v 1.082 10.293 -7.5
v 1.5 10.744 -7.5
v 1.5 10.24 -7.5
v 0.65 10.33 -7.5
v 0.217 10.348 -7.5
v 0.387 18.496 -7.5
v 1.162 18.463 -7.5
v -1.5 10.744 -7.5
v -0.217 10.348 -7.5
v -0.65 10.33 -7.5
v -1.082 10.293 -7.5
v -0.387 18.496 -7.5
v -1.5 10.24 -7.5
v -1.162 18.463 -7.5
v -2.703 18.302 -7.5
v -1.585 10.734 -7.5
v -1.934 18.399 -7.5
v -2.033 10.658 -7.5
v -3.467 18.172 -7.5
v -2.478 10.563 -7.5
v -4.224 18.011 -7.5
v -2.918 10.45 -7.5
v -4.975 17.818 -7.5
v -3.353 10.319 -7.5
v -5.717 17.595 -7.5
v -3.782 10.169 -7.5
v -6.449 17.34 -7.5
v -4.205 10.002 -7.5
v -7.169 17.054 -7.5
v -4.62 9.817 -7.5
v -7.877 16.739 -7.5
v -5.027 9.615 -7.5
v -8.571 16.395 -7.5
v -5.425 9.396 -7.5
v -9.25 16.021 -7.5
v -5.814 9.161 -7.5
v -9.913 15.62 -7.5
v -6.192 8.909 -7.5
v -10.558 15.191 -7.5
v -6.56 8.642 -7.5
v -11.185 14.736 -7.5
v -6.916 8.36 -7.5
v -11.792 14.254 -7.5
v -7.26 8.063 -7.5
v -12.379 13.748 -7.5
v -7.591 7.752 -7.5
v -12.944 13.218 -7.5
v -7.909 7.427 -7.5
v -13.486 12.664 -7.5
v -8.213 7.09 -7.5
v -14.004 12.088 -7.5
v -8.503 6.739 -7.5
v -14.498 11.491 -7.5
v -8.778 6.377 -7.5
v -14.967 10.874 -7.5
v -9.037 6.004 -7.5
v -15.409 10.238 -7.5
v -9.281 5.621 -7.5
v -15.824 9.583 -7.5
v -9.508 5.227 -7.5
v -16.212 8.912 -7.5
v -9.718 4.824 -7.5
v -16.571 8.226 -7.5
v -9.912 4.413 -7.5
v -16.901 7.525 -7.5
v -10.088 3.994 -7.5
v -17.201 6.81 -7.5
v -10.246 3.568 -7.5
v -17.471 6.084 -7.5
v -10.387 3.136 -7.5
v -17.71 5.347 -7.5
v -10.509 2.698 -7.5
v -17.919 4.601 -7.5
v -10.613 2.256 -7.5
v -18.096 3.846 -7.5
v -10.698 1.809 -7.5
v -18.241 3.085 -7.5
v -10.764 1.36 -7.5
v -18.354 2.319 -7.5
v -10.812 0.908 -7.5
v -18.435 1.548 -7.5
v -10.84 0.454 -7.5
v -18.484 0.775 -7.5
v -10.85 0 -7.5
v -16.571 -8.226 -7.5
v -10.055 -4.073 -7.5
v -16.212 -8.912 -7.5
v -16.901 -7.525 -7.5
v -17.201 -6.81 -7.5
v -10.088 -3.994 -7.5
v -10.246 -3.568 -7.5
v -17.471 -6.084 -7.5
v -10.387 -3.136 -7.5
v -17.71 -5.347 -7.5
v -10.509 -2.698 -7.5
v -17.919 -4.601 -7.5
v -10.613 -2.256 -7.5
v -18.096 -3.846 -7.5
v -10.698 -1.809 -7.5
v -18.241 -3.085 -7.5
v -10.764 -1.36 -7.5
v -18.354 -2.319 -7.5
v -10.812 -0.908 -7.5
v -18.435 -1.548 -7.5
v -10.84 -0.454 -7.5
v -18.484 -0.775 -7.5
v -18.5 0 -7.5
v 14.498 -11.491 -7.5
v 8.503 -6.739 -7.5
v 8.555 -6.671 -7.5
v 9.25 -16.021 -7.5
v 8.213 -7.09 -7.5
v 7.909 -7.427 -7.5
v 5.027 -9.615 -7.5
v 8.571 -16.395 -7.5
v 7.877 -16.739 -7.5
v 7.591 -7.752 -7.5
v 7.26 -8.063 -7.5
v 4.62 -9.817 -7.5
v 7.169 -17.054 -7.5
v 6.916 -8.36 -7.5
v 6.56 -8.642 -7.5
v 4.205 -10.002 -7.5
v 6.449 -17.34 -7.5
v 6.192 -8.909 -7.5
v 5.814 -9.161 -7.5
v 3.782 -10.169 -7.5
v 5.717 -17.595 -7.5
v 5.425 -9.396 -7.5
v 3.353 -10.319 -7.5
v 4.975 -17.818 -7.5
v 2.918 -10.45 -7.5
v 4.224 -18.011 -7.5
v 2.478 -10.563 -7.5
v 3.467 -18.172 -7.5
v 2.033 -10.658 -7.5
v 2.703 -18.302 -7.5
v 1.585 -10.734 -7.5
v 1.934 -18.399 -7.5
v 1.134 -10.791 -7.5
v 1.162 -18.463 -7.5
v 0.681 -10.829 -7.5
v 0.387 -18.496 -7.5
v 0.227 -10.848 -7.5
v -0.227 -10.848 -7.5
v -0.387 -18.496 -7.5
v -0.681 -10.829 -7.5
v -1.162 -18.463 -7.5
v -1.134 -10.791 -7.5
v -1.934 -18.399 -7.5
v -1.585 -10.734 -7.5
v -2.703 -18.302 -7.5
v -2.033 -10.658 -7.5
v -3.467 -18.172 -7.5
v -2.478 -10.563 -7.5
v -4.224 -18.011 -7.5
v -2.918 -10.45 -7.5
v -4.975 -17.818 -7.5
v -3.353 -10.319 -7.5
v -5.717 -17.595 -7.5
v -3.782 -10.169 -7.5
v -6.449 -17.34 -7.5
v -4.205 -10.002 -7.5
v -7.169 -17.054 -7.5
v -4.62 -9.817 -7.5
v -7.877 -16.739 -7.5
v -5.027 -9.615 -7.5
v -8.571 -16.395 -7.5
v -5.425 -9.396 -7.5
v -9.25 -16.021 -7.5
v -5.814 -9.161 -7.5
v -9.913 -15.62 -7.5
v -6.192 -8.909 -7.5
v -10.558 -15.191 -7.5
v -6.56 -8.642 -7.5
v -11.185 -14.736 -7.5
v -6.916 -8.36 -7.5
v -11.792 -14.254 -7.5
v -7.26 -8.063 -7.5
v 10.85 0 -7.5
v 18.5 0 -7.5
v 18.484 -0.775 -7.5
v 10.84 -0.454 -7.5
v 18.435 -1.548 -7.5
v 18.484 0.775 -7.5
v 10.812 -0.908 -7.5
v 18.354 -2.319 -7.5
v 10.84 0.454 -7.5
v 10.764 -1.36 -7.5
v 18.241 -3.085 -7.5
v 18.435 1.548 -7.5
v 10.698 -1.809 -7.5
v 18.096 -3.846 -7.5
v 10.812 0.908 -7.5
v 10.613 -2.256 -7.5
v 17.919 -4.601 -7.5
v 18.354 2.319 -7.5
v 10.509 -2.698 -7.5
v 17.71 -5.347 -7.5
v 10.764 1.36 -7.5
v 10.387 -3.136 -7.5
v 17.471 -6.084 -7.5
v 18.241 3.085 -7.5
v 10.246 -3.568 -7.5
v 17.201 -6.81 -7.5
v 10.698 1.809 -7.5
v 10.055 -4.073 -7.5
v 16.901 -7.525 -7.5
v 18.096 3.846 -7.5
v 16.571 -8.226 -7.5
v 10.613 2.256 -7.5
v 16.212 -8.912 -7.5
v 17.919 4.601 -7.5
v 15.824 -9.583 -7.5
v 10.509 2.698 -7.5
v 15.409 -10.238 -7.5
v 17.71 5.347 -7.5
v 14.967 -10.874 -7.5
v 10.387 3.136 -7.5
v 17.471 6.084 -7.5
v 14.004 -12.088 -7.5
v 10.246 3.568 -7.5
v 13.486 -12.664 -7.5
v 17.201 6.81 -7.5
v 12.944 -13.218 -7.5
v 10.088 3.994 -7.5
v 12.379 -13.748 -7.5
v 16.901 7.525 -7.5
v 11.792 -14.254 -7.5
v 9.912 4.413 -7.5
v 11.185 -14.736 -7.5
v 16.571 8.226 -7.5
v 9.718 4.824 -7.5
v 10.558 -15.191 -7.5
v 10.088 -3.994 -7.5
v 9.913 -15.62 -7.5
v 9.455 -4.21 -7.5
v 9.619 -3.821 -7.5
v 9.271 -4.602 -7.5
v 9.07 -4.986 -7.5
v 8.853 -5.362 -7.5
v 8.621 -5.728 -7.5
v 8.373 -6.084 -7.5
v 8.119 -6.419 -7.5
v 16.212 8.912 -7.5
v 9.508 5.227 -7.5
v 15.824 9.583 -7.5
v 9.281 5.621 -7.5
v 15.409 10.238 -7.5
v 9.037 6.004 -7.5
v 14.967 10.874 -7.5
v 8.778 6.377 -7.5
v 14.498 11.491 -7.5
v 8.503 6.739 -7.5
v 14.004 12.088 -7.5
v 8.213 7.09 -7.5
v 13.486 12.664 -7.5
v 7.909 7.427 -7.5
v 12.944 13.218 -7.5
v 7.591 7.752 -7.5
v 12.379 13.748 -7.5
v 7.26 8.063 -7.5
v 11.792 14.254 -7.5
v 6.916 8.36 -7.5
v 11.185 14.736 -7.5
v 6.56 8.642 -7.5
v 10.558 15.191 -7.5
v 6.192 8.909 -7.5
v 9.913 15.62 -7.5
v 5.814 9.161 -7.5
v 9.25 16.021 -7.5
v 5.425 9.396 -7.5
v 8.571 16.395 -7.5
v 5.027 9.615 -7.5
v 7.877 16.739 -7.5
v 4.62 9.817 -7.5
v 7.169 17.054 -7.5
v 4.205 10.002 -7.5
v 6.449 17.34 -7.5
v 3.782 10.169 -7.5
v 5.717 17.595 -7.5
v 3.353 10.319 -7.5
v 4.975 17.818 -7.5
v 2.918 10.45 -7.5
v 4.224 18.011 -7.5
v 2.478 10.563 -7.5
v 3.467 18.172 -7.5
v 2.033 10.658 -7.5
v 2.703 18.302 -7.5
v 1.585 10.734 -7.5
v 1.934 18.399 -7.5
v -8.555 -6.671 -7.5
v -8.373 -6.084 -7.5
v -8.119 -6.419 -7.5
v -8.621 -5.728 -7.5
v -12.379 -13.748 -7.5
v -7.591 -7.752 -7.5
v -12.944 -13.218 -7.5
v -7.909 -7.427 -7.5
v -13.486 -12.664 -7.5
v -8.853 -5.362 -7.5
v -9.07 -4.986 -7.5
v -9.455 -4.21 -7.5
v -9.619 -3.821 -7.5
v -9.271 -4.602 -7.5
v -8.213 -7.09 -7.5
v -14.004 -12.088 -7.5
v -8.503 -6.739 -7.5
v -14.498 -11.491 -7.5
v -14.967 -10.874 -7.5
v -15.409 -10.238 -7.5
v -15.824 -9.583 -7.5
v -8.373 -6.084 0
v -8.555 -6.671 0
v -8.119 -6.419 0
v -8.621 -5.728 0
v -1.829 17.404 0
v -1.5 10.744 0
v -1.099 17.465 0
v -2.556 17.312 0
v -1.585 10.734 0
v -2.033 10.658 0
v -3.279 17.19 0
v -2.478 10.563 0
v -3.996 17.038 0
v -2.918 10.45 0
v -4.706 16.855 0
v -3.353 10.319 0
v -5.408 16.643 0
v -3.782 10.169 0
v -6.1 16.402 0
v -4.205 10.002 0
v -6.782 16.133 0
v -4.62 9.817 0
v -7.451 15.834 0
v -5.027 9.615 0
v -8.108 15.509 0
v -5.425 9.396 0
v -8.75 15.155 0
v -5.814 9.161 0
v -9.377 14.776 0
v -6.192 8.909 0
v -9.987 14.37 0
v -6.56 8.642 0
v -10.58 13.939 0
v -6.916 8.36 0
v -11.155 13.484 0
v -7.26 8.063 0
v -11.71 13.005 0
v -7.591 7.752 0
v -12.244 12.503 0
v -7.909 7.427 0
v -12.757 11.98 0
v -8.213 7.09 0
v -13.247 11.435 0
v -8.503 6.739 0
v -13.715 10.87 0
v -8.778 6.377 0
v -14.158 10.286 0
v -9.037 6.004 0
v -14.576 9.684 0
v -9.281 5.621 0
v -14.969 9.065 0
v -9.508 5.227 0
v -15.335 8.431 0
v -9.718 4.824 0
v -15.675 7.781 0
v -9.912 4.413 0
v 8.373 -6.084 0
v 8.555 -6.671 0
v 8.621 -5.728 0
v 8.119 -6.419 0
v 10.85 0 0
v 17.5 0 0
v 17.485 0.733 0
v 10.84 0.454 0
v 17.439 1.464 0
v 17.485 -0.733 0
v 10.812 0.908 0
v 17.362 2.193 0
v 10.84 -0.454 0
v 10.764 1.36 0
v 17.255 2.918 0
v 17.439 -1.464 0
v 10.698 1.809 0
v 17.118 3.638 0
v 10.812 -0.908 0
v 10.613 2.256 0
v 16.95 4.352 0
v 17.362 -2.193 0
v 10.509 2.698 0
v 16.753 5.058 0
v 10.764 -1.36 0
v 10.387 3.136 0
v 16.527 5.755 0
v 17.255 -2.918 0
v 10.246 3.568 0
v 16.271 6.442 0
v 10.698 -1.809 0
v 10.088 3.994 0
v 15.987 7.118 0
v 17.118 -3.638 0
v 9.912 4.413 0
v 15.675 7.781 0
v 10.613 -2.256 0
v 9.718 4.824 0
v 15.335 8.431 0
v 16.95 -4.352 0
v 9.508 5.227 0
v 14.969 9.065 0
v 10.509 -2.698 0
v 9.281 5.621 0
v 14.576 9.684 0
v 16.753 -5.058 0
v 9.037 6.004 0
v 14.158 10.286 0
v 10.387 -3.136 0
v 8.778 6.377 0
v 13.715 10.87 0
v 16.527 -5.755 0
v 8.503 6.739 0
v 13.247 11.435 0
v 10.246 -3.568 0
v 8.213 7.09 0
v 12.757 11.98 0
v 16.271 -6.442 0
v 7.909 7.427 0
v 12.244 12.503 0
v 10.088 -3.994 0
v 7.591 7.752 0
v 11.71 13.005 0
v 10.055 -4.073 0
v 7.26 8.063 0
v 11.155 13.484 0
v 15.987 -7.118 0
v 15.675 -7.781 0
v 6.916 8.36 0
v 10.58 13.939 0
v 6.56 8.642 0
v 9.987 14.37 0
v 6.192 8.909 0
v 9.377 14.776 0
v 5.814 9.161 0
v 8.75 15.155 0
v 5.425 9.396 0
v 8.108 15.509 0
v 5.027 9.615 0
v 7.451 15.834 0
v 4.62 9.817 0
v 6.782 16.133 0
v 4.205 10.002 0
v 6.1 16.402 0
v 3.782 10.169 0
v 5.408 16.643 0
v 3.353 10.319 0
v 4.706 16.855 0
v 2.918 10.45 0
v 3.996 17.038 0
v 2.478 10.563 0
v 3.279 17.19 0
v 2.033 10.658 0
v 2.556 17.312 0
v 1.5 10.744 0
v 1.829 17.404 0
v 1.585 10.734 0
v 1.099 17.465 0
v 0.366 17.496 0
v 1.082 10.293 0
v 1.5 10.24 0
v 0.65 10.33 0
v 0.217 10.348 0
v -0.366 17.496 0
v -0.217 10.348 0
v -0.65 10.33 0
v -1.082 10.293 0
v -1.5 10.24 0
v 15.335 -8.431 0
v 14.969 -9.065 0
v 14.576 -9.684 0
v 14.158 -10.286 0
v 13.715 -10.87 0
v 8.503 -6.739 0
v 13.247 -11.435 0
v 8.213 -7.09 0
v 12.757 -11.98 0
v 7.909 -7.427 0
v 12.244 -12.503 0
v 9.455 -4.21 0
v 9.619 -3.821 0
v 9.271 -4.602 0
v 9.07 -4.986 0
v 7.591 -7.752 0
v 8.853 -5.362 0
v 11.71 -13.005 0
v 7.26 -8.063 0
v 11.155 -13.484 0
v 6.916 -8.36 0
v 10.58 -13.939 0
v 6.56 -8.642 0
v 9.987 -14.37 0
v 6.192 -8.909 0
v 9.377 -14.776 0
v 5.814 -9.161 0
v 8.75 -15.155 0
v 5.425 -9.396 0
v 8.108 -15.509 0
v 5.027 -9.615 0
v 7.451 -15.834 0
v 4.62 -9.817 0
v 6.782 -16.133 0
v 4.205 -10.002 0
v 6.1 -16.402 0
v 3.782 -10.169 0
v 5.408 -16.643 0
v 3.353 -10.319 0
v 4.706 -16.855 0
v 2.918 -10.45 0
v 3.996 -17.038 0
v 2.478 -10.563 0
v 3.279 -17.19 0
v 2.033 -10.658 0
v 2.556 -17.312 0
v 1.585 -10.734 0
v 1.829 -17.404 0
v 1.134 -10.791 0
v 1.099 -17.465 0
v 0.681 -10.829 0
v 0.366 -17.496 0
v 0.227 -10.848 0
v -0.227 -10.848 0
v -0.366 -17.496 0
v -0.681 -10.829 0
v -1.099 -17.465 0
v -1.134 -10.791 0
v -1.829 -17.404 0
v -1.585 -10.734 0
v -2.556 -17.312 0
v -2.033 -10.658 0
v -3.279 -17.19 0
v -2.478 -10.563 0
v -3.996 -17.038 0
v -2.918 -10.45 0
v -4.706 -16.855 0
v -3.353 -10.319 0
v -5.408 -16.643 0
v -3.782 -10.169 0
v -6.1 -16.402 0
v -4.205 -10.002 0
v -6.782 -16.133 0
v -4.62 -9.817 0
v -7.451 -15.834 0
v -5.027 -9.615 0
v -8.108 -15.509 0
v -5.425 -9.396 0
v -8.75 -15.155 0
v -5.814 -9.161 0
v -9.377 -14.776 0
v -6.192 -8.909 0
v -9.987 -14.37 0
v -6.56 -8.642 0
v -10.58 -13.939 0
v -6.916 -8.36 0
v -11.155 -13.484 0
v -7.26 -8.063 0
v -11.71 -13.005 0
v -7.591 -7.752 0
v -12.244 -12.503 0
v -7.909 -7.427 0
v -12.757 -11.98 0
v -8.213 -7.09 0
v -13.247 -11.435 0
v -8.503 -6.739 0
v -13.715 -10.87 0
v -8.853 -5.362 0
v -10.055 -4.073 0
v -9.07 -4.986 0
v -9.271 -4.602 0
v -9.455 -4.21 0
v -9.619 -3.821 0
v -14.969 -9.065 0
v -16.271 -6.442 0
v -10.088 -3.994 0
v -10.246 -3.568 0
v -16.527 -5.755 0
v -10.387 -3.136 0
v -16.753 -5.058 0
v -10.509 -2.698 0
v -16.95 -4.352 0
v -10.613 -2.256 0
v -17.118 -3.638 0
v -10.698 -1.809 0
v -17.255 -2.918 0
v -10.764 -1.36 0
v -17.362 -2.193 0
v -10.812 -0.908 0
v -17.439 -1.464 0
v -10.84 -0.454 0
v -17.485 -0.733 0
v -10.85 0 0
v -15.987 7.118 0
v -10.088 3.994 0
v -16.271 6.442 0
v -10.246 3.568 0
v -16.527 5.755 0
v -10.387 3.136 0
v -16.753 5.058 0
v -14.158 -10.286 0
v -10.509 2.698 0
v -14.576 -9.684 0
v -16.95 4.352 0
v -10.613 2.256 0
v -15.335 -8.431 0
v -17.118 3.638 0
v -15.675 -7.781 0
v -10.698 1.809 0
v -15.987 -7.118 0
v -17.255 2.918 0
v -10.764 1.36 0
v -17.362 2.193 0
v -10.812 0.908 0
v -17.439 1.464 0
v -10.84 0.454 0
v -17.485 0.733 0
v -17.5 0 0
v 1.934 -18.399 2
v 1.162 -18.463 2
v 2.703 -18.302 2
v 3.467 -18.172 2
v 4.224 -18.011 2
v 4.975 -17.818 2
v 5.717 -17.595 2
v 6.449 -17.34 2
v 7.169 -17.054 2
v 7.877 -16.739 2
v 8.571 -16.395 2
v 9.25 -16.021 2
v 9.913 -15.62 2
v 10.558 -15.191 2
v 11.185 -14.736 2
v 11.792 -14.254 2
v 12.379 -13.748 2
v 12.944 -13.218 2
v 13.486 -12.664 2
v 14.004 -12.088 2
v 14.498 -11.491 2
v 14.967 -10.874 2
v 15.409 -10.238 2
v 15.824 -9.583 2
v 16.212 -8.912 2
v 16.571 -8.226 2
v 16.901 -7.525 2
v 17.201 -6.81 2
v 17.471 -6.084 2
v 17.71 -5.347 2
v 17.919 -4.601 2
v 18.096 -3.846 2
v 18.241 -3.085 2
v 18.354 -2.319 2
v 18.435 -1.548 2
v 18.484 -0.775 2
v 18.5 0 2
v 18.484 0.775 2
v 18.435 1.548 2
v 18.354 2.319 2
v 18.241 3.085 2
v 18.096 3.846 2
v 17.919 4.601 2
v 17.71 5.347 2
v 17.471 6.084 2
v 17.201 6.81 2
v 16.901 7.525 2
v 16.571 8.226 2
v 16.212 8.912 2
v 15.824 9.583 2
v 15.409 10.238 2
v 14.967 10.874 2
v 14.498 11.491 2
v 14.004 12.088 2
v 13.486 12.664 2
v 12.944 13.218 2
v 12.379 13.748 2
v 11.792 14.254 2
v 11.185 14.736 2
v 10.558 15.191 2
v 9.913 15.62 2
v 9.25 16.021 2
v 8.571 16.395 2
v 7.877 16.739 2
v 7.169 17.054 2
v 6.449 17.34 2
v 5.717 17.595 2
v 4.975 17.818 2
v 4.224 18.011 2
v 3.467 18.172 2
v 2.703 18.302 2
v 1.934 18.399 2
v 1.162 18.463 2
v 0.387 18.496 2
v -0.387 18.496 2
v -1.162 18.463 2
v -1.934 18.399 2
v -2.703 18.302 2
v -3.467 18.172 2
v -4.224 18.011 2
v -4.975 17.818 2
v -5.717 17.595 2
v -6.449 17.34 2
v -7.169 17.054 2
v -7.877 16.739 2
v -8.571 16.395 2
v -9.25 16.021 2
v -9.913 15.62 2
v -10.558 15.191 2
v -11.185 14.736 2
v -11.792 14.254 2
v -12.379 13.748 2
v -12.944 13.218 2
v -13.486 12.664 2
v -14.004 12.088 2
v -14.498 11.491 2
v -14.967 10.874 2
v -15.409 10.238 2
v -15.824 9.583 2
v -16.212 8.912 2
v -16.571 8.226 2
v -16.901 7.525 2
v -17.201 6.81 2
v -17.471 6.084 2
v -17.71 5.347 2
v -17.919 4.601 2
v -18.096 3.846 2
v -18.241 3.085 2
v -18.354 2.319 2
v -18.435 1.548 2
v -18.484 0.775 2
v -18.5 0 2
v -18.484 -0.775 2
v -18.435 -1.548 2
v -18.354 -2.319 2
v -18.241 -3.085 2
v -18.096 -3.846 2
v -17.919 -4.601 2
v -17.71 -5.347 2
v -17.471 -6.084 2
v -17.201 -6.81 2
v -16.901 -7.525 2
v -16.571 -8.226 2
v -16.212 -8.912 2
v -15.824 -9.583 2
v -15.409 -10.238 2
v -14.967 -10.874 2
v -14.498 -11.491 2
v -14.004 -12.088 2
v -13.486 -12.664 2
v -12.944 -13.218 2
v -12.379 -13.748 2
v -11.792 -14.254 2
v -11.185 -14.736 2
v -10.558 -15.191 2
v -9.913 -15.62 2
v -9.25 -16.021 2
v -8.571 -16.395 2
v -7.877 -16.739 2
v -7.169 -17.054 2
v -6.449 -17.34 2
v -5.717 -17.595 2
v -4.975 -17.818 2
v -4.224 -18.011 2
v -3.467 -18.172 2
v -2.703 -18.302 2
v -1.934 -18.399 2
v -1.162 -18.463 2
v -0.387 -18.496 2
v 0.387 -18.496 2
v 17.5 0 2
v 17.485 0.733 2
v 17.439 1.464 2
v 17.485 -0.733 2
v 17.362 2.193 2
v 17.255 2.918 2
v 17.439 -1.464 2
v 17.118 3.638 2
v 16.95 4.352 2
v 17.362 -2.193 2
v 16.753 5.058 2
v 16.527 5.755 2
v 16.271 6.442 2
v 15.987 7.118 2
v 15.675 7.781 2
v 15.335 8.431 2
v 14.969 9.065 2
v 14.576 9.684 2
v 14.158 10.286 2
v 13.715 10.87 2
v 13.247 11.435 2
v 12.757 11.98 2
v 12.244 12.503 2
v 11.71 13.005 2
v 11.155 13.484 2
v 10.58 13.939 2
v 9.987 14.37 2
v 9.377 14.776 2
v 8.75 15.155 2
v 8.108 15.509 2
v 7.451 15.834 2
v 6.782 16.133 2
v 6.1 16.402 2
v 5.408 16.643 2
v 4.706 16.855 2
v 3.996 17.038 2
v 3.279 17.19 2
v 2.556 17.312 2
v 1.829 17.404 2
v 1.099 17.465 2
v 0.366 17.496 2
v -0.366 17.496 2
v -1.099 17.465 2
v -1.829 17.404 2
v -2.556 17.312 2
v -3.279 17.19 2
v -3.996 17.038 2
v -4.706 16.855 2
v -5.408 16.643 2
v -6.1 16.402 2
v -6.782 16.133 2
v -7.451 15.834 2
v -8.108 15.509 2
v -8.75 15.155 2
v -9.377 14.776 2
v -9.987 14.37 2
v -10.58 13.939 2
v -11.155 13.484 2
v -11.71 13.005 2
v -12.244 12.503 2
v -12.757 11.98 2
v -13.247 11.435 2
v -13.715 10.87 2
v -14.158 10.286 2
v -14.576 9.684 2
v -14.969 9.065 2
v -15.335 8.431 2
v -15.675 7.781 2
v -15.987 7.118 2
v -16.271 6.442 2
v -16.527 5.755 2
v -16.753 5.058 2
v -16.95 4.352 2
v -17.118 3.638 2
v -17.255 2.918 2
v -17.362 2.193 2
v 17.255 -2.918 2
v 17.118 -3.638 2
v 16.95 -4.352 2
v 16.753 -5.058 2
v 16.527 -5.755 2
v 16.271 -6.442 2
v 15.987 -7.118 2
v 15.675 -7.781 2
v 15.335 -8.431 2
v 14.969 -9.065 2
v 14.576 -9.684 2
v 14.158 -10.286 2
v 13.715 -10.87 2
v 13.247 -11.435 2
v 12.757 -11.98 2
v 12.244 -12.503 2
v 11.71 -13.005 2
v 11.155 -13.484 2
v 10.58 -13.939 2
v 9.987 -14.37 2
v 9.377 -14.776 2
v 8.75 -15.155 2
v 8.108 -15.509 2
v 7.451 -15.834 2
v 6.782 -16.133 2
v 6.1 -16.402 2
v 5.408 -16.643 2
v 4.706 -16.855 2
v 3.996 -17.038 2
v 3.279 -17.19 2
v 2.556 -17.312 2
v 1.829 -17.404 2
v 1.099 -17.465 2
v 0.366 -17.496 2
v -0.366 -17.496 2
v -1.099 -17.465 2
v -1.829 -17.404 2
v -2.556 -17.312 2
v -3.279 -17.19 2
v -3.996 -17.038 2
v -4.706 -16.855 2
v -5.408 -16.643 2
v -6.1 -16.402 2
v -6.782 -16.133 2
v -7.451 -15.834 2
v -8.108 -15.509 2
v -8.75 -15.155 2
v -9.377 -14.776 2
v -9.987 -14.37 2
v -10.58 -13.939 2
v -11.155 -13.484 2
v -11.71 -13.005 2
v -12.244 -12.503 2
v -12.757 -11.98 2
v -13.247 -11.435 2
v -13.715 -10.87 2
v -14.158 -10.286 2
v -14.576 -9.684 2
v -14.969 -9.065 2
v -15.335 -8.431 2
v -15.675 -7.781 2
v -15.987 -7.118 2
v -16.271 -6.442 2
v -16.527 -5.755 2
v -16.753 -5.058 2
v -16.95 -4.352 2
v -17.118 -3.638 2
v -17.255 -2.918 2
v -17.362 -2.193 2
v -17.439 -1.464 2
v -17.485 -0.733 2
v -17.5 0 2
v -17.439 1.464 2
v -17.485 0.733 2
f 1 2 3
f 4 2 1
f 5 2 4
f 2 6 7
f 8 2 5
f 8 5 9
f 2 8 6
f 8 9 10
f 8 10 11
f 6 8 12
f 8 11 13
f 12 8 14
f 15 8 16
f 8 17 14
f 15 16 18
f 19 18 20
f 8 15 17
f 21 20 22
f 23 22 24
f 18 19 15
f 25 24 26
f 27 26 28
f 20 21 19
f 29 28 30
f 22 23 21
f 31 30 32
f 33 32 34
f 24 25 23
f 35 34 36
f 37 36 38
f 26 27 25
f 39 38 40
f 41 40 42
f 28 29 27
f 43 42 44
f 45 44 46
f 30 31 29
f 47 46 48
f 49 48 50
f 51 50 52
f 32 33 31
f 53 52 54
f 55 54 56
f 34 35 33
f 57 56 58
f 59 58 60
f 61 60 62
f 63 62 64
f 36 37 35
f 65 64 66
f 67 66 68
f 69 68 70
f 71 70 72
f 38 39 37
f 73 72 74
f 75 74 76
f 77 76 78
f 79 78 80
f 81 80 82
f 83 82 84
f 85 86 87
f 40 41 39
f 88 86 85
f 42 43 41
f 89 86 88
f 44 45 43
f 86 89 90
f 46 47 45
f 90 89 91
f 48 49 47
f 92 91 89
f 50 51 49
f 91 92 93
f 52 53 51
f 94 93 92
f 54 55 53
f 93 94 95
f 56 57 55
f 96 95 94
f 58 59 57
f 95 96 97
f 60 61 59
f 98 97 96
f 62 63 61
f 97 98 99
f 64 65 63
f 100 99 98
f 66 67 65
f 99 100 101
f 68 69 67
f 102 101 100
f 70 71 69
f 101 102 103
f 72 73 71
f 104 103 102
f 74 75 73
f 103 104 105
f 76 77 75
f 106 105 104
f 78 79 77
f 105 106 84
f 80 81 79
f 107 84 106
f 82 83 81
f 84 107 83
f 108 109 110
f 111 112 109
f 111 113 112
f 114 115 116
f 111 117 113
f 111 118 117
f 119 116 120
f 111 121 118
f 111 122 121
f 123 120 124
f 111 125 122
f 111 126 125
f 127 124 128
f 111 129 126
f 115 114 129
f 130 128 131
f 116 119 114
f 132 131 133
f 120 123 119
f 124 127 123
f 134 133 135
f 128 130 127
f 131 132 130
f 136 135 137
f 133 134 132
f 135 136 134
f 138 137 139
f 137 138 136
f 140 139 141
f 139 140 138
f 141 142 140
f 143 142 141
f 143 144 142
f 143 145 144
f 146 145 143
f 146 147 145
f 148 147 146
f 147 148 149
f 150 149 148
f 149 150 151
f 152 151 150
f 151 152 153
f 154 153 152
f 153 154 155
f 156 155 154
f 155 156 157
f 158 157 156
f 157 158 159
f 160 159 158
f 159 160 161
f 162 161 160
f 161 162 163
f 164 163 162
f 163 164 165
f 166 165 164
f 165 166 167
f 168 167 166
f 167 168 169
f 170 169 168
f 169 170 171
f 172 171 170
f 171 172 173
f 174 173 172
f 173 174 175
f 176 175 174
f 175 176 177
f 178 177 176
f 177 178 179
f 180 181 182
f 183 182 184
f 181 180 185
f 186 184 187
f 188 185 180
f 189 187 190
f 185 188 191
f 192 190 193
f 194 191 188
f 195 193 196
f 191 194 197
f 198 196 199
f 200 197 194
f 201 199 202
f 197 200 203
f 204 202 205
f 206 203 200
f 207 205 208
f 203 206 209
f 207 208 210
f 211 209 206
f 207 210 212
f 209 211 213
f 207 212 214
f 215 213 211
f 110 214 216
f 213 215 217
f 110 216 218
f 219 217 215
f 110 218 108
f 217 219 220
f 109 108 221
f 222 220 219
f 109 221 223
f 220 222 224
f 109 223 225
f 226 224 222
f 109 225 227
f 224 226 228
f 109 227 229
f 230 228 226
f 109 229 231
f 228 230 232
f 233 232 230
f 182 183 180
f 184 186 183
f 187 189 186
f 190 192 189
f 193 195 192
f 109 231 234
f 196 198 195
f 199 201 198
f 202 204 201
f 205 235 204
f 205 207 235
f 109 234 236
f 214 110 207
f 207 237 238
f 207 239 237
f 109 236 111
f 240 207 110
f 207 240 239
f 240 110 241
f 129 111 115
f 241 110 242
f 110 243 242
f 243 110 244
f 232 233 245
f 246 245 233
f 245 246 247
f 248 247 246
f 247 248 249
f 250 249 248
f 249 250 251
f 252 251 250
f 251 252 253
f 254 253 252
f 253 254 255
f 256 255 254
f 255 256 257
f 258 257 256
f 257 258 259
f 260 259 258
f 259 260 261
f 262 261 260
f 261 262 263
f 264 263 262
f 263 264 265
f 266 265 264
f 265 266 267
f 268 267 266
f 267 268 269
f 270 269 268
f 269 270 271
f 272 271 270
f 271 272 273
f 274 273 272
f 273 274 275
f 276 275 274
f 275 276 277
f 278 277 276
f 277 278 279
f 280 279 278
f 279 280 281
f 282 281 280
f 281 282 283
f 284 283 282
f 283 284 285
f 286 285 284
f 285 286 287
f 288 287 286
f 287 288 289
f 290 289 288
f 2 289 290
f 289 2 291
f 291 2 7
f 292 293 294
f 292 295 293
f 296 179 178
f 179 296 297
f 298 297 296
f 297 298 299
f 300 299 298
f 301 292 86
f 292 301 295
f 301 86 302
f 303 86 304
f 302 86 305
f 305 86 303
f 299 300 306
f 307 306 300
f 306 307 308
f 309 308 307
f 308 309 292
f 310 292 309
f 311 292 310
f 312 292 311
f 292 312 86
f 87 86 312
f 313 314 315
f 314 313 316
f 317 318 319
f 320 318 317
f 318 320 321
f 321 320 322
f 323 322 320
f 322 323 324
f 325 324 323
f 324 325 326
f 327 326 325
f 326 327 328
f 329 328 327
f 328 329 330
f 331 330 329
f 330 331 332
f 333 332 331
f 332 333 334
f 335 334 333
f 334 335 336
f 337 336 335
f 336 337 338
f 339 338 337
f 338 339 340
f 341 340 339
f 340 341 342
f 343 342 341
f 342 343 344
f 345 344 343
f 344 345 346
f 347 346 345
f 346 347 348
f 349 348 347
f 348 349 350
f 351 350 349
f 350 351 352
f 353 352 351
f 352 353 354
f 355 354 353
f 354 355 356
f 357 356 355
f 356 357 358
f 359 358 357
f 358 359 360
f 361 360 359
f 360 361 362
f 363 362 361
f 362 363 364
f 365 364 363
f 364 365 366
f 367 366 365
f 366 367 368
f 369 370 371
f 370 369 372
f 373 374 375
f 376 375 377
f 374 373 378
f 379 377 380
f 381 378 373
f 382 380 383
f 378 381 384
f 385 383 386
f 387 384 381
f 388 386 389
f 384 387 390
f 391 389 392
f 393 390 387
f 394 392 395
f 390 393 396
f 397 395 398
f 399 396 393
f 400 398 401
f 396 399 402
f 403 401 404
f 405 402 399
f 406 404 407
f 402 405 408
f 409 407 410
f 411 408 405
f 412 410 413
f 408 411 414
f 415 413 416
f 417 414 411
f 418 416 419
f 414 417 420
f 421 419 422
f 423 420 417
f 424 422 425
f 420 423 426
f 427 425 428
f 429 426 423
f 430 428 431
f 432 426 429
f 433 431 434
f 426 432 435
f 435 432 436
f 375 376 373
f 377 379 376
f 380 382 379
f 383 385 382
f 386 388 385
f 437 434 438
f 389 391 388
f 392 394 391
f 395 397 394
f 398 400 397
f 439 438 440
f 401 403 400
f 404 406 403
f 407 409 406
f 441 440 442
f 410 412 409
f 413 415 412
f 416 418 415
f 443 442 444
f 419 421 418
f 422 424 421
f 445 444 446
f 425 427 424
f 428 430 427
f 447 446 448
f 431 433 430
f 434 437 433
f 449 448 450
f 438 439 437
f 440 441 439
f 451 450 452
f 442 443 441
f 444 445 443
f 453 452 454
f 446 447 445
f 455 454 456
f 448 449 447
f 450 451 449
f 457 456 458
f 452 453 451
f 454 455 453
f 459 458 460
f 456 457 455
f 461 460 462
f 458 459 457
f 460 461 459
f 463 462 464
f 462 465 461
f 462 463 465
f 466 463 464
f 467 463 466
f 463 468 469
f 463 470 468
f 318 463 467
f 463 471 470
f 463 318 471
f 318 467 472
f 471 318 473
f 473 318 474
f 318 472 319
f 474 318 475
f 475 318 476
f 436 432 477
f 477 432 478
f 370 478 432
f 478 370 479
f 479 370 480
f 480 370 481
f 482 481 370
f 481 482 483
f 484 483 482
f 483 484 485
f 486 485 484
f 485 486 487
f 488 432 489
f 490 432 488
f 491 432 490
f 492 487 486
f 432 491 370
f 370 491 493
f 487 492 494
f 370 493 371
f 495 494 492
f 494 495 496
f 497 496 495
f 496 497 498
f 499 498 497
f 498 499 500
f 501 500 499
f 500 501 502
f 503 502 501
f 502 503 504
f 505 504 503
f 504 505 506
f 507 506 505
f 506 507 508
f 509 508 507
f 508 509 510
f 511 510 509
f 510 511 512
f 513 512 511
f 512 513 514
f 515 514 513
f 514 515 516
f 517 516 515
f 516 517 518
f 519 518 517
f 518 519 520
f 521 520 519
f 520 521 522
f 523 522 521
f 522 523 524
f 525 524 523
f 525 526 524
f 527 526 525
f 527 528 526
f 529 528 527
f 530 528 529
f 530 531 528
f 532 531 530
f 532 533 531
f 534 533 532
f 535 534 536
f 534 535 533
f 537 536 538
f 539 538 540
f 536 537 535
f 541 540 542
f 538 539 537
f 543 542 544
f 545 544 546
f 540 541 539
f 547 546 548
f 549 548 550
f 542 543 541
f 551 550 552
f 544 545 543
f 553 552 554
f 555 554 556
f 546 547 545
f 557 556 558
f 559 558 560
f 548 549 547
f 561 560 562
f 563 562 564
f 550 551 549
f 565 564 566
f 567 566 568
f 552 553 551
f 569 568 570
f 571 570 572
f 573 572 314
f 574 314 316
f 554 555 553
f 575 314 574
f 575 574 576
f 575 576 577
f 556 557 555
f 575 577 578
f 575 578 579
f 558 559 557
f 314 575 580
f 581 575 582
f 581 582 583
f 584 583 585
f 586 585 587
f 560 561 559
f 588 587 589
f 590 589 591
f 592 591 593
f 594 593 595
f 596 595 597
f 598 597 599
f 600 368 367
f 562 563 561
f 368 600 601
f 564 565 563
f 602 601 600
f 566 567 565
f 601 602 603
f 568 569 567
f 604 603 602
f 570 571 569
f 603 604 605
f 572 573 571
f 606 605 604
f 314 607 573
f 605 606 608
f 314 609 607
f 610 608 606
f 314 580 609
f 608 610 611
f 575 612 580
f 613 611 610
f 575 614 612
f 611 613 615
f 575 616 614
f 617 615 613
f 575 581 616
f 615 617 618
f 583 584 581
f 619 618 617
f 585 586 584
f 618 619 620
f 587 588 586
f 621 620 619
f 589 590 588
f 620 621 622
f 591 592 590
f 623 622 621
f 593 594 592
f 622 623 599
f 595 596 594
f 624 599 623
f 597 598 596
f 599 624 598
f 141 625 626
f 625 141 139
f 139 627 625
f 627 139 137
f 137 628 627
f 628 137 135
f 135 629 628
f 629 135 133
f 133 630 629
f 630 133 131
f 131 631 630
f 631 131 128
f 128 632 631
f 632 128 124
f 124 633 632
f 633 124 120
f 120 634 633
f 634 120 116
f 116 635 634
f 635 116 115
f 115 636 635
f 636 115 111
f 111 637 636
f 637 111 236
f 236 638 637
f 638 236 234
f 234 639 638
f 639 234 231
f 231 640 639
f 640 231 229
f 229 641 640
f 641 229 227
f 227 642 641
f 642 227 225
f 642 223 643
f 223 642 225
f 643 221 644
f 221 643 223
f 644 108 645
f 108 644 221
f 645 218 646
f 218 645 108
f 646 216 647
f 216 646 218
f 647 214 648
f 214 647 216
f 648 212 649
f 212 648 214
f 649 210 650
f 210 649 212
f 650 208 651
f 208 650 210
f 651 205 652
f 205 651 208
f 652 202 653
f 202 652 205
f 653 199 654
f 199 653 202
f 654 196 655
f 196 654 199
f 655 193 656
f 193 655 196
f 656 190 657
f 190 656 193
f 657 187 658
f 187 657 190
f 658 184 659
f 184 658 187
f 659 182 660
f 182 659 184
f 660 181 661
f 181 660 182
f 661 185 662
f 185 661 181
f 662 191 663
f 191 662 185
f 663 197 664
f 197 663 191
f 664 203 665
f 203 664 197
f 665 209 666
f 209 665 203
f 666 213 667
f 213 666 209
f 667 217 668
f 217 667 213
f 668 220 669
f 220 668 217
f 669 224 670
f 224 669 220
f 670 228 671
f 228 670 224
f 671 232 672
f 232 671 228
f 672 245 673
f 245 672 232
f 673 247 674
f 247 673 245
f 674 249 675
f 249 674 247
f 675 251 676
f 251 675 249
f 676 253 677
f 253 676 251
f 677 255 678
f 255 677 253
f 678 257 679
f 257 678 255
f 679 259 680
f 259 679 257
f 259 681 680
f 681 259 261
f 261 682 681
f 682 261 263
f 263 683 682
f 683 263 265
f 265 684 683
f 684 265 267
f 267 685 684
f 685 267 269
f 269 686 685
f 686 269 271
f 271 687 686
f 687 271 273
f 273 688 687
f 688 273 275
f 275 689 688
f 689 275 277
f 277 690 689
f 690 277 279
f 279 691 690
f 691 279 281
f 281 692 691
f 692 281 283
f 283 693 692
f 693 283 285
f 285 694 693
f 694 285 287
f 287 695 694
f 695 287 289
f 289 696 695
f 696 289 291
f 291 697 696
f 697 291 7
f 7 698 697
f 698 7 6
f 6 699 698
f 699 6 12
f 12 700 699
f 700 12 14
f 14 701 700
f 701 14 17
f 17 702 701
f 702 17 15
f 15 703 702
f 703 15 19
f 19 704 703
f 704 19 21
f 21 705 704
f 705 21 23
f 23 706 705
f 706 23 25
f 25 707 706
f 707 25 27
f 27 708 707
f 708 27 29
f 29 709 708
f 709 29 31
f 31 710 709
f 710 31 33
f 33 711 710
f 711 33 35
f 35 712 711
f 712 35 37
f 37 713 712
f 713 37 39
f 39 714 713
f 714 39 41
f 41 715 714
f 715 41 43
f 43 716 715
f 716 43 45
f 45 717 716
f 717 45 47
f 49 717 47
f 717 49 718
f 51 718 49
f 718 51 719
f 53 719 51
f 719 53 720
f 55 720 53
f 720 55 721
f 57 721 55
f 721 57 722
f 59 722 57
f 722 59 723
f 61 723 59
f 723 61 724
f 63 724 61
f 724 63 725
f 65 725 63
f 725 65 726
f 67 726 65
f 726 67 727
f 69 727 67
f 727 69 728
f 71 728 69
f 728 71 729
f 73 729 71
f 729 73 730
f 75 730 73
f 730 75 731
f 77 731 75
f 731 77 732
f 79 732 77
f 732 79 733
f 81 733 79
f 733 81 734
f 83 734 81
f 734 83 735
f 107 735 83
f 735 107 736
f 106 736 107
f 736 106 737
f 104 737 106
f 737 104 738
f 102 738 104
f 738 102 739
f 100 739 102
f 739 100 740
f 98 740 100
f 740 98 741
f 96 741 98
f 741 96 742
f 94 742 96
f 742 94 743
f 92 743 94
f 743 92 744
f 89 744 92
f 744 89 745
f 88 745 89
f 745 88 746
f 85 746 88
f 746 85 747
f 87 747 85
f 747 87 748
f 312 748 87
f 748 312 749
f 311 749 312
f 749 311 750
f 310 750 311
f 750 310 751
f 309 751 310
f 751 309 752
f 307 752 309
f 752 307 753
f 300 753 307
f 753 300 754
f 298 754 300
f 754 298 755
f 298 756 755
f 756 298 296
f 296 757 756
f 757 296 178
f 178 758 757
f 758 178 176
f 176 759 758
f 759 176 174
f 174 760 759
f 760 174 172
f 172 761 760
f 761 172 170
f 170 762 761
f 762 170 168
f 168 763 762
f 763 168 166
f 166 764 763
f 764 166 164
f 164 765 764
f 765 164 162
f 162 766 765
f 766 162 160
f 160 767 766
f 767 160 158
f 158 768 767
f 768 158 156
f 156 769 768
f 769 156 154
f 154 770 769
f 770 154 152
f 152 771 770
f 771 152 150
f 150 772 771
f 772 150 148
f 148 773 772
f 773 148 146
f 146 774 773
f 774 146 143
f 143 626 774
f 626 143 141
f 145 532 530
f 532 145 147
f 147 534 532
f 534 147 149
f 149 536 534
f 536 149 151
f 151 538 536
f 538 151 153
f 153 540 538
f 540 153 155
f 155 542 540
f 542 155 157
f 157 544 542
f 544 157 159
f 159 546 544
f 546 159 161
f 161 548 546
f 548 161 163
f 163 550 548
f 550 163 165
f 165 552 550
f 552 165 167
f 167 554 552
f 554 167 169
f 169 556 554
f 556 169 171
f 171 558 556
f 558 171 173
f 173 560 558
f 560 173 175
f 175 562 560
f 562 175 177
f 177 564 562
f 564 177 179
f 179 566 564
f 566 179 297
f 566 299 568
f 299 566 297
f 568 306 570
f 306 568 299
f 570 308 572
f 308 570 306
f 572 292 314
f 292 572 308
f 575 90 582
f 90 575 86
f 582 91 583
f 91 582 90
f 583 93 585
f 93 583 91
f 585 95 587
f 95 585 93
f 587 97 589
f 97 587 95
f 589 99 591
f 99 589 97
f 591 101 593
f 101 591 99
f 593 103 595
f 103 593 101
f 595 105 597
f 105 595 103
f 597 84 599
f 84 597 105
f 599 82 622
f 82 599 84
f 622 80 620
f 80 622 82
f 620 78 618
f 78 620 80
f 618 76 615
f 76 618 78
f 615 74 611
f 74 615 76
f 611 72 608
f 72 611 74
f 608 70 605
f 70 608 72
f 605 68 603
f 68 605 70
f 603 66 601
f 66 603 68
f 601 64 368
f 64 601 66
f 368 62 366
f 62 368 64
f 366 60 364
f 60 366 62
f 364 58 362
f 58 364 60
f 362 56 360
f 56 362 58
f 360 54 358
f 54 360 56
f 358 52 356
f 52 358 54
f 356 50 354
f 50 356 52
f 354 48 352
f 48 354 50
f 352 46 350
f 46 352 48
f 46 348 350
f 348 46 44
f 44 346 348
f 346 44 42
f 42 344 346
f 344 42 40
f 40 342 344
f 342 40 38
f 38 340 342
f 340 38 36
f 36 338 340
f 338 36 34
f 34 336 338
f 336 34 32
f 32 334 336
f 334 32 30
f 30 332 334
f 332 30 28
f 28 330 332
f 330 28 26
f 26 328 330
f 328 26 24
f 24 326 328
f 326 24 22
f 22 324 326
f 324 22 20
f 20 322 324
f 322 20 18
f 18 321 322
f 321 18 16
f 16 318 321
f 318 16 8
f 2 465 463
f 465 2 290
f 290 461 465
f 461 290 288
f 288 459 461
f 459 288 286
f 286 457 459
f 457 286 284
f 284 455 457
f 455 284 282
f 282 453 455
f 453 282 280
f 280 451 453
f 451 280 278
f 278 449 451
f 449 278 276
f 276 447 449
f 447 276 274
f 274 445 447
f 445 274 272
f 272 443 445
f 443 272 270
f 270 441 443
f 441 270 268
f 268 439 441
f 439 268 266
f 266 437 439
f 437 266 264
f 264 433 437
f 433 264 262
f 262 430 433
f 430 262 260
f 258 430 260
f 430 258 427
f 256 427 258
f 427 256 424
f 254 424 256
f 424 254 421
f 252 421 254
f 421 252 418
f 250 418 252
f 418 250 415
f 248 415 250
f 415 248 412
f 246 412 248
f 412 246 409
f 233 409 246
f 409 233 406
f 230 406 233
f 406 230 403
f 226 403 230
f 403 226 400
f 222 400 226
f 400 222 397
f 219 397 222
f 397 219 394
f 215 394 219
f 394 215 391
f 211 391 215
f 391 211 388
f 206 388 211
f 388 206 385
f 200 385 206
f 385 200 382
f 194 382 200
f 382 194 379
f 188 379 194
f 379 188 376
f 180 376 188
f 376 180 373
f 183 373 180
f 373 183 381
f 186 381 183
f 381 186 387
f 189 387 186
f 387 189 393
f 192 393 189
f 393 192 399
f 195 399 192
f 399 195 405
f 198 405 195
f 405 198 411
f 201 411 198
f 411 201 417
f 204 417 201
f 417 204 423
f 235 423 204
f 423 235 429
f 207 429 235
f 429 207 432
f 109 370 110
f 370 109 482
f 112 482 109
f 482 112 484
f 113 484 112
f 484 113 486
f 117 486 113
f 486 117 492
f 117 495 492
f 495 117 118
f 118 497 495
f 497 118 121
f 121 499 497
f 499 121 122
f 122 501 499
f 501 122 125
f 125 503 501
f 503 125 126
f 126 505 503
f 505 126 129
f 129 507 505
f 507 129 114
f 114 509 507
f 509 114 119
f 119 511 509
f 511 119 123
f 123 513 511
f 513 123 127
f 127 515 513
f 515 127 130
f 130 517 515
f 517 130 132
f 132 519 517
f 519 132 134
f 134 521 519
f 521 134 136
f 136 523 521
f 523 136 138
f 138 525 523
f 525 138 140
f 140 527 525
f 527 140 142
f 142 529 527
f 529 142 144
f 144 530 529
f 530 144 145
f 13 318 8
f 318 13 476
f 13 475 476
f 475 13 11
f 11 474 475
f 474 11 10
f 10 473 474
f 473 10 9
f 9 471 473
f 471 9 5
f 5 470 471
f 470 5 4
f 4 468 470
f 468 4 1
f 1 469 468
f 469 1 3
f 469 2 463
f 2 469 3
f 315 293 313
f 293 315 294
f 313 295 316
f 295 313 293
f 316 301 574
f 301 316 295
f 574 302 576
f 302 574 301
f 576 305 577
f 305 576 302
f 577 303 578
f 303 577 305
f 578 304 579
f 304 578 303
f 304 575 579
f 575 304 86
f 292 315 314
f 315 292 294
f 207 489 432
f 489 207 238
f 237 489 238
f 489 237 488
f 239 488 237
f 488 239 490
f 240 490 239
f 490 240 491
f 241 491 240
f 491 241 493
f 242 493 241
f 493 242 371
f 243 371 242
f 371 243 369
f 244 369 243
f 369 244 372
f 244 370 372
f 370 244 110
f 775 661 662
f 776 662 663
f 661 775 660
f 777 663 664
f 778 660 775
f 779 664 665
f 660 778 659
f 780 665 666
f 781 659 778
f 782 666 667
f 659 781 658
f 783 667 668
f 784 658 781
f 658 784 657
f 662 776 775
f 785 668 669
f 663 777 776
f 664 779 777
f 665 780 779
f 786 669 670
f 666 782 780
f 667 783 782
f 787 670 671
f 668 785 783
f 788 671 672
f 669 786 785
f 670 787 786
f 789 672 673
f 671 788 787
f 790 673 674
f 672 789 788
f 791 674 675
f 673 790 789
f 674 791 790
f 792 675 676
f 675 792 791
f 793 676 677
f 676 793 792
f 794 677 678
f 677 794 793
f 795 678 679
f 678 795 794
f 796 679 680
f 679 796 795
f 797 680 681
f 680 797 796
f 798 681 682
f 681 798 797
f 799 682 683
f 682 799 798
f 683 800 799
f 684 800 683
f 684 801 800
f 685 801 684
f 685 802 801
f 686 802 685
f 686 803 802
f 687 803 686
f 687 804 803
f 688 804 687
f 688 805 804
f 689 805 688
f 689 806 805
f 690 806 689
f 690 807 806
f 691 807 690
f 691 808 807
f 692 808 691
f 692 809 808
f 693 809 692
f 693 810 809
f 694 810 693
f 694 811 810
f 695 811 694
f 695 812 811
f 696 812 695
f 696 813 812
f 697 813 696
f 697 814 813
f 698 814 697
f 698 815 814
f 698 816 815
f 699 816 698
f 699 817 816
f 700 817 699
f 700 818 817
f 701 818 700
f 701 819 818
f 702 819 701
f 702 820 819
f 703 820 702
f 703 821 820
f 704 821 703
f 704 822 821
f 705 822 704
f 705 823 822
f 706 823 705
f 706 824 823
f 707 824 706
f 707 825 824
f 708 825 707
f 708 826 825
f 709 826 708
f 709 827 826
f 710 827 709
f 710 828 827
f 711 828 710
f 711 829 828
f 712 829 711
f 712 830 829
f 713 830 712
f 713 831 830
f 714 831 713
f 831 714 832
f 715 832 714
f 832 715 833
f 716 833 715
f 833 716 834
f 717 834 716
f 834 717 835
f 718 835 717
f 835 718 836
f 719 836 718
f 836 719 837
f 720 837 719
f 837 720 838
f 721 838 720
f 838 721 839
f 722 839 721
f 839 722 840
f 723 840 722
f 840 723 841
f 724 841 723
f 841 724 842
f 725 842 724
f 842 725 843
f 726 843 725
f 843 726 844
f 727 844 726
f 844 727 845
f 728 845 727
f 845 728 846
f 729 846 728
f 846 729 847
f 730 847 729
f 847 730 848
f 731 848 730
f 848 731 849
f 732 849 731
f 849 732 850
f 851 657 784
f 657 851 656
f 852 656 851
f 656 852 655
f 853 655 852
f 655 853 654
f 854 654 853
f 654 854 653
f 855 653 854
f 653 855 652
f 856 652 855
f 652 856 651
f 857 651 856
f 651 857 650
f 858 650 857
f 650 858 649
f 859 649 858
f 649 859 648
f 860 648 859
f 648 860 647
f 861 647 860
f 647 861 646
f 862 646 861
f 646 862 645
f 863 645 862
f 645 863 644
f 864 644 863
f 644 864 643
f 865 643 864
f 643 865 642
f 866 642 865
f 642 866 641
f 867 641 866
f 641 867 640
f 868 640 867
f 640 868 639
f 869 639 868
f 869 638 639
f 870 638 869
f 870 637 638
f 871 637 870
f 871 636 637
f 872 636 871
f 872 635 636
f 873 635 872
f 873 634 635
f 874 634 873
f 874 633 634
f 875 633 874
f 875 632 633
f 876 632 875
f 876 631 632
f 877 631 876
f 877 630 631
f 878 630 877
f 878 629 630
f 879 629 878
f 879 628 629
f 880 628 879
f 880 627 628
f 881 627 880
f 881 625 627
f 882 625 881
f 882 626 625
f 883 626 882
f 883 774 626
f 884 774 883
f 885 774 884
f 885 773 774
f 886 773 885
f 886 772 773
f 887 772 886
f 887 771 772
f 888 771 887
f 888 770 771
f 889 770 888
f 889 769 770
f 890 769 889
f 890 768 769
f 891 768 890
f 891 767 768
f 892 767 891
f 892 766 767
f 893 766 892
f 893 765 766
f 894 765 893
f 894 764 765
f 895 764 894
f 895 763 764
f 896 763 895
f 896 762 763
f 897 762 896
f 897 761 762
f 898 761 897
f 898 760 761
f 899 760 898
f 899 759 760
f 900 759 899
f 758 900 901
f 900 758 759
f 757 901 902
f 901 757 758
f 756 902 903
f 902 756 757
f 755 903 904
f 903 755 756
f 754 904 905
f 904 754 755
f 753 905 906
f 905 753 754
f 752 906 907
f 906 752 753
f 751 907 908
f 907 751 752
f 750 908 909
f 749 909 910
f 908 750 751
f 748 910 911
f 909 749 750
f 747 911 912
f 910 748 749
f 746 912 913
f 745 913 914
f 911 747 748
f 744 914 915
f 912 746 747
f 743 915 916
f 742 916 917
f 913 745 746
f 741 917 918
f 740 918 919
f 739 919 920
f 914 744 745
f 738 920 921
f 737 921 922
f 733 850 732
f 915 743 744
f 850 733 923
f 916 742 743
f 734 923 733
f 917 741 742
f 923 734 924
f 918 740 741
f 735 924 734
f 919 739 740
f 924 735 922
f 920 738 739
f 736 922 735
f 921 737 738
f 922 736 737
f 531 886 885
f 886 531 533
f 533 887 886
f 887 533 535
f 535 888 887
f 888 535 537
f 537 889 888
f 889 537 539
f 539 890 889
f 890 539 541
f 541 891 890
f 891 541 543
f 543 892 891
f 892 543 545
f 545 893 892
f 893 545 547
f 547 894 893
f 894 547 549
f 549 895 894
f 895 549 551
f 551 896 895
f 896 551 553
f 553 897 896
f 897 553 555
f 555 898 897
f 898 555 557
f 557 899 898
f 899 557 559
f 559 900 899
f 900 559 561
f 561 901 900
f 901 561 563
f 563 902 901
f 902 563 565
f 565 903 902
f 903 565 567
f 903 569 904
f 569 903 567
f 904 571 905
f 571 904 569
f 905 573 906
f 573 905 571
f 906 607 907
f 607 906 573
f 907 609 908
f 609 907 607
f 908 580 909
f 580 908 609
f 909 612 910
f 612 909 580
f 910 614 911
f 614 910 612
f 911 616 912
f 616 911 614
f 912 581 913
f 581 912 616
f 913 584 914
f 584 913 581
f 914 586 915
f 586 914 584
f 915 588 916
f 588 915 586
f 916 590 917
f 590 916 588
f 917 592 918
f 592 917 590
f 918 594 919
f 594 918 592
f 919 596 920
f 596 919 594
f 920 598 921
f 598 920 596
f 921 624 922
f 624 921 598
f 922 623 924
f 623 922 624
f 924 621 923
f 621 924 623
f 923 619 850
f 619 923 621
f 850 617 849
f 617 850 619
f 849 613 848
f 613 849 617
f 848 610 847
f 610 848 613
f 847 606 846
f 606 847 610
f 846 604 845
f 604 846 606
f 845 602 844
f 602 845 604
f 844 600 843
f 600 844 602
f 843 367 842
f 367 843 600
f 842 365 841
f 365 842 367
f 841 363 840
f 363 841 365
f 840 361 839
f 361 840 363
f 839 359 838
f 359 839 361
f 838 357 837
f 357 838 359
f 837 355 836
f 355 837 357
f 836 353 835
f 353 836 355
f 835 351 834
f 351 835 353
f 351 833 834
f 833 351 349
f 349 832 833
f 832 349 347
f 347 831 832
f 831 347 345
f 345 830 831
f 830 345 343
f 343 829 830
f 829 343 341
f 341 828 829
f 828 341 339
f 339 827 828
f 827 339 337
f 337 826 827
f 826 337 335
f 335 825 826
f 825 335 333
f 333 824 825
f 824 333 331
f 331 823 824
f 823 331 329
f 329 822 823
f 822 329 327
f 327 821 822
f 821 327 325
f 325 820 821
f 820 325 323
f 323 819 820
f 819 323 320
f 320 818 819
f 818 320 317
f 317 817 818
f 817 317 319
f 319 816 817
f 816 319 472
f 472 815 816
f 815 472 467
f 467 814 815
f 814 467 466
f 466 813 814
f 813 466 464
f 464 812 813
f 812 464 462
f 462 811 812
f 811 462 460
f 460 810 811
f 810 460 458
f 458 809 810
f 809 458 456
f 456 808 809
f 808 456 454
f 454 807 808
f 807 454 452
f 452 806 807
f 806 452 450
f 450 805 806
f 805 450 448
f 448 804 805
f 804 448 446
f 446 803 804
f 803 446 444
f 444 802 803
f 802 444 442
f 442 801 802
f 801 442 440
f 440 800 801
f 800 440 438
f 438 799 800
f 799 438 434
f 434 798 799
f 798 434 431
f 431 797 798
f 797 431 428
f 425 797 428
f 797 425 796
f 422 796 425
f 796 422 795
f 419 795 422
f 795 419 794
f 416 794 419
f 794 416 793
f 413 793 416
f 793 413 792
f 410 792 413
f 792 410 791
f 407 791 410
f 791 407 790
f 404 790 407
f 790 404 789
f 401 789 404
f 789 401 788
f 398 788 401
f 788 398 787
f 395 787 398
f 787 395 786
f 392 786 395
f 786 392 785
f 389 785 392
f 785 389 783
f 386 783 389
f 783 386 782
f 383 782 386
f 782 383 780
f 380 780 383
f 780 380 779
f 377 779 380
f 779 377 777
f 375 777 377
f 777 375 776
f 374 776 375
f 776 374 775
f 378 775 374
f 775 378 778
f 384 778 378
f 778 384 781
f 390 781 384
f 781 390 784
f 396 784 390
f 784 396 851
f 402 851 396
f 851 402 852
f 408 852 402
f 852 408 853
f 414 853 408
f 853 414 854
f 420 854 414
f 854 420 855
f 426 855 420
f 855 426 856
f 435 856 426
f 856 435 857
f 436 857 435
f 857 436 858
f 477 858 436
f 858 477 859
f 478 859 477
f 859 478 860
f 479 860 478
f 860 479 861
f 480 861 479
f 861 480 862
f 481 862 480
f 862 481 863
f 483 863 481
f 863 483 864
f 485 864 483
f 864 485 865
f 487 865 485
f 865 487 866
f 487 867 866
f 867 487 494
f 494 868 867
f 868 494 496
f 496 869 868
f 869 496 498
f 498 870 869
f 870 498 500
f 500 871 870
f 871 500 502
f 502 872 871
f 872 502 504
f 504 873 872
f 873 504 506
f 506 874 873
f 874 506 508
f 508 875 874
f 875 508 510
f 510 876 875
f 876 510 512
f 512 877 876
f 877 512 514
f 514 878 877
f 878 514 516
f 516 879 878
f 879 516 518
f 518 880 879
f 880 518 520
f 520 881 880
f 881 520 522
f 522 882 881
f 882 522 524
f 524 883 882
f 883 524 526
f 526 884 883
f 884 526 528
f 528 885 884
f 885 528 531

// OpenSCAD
// file: shared-variables.scad
encoder_cover_diameter = 37;
encoder_cover_height = 2;
encoder_cover_inset = 2;
// file: ../../common/shared-variables.scad
$fn = 150;

u_1 = 19.05;

plate_corner_radius = 2;


switch_neck_thickness = 1.2;
switch_neck_width = 13.9;
switch_hole_width = switch_neck_width + 2;

rotary_encoder_width = 17;
rotary_encoder_height = 17;

magnet_diameter = 5 + 0.3;
magnet_depth = 2 + 0.2;
magnet_inset = 5;

module_width_x_unit = 20;
module_height_y = 180;

module_bottom_base_thickness = 4;

pcb_thickness = 1.6;

wall_tolerance = 0.5;
outer_wall_thickness_base = 2;
outer_wall_thickness = outer_wall_thickness_base - (wall_tolerance / 2);
inner_wall_thickness = 2;

inner_wall_height = 3;
outer_wall_height = inner_wall_height + pcb_thickness;

screw_hole_diameter = 2.7;
screw_hole_inset_pcb = 4;
screw_hole_inset = screw_hole_inset_pcb + outer_wall_thickness_base;
screw_head_height = 1.6;
screw_head_diameter = 4;

threaded_insert_towers_diameter = 5;
threaded_insert_towers_radius = threaded_insert_towers_diameter / 2;

threaded_insert_length = 4;
threaded_insert_knurl_diameter = 3;

side_connector_height = 4.7;
side_connector_length = 23;
side_connector_offset = 40;

back_connector_height = 5;
back_connector_offset = 15;

bottom_module_base_cutout_inset_x = 10;
bottom_module_base_cutout_inset_y = 10;

module_top_thickness = 2;
module_top_cover_thickness = 4.5;

module_total_height = module_bottom_base_thickness + outer_wall_height + module_top_thickness;
// file: ../../common/shared-utils.scad
include <./shared-variables.scad>

module rounded_rectangle(size, corner_radius, center = false) {

    x_offset = center ? -size.x / 2 : 0;
    y_offset = center ? -size.y / 2 : 0;

    corners_points = [
            [corner_radius, corner_radius],
            [size.x - corner_radius, corner_radius],
            [size.x - corner_radius, size.y - corner_radius],
            [corner_radius, size.y - corner_radius],
        ];

    hull() {
        for (p = corners_points) {
            translate([p.x + x_offset, p.y + y_offset, -1])
                circle(corner_radius);
        }
    }
}

module rectangle_with_circle_corners(size, circle_radius = 1, center = false) {
    x_offset = center ? 0 : size.x / 2;
    y_offset = center ? 0 : size.y / 2;
    offset = [x_offset, y_offset];

    translate(offset) {
            square(size, center = true);

            x = (size.x / 2) - circle_radius/2;
            y = (size.y / 2) - circle_radius/2;
            points = [[-x, -y], [x, -y], [-x, y], [x, y]];

            for (p = points) {
                translate([p.x, p.y]) {
                    circle(r = circle_radius);
                }
            }
    }
}

module circle_segment(radius, cut_off_height) {
    intersection() {
        translate([0, -cut_off_height]) {
            circle(radius);
        }
        translate([-radius, 0]) {
            square([radius * 2, cut_off_height * 2]);
        }
    }
}

module tear_drop_circle(d) {
    r = d / 2;
    angle = 30;
    offset_y = r / 2;
    offset_x = cos(angle) * r;

    triangle_points = [
            [-offset_x, r / 2],
            [offset_x, r / 2],
            [0, 3 / 2 * r]
        ];

    polygon(triangle_points);
    circle(d = d);
}

module threaded_insert_cutout(k = threaded_insert_knurl_diameter, l = threaded_insert_length) {

    k1 = k + 0.2;
    k2 = k * 0.9;

    l1 = l * 0.25;
    l2 = l + 1;

    translate([0, 0, -l1]) {
        linear_extrude(l1) {
            circle(d = k1);
        }
    }

    translate([0, 0, -l2]) {
        linear_extrude(l2) {
            circle(d = k2);
        }
    }
}

function flatten(l) = [ for (a = l) for (b = a) b ] ;
// main file
use <../../common/shared-utils.scad>
include <../../common/shared-variables.scad>
include <./shared-variables.scad>

inner_diameter = 21.70;
spoke_width = 3; // 3.2
spoke_depth = 0.5; // 0.8
spoke_height = 7.5; //7.5;

encoder_cover();

module encoder_cover() {
    linear_extrude(encoder_cover_height) {
        difference() {
            circle(d = encoder_cover_diameter);
            circle(d = encoder_cover_diameter - encoder_cover_inset);
        }
    }

    translate([0, 0, -spoke_height]) {
        difference() {
            union() {
                linear_extrude(spoke_height) {
                    difference() {
                        circle(d = encoder_cover_diameter);
                        circle(d = inner_diameter);
                    }
                }

                upper_spokes_cutouts();
            }

            union() {
            }
        }
    }
}

module upper_spokes_cutouts() {
    linear_extrude(spoke_height) {
        intersection() {
            union() {
                for (i = [1, 2, 3]) {
                    angle = i * 120;

                    rotate(angle) {
                        translate([-spoke_width / 2, 0]) {
                            square([spoke_width, inner_diameter]);
                        }
                    }
                }
            }

            union() {
                #difference() {
                    circle(d = inner_diameter);
                    circle(d = inner_diameter - spoke_depth*2);
                }
            }
        }
    }
}
